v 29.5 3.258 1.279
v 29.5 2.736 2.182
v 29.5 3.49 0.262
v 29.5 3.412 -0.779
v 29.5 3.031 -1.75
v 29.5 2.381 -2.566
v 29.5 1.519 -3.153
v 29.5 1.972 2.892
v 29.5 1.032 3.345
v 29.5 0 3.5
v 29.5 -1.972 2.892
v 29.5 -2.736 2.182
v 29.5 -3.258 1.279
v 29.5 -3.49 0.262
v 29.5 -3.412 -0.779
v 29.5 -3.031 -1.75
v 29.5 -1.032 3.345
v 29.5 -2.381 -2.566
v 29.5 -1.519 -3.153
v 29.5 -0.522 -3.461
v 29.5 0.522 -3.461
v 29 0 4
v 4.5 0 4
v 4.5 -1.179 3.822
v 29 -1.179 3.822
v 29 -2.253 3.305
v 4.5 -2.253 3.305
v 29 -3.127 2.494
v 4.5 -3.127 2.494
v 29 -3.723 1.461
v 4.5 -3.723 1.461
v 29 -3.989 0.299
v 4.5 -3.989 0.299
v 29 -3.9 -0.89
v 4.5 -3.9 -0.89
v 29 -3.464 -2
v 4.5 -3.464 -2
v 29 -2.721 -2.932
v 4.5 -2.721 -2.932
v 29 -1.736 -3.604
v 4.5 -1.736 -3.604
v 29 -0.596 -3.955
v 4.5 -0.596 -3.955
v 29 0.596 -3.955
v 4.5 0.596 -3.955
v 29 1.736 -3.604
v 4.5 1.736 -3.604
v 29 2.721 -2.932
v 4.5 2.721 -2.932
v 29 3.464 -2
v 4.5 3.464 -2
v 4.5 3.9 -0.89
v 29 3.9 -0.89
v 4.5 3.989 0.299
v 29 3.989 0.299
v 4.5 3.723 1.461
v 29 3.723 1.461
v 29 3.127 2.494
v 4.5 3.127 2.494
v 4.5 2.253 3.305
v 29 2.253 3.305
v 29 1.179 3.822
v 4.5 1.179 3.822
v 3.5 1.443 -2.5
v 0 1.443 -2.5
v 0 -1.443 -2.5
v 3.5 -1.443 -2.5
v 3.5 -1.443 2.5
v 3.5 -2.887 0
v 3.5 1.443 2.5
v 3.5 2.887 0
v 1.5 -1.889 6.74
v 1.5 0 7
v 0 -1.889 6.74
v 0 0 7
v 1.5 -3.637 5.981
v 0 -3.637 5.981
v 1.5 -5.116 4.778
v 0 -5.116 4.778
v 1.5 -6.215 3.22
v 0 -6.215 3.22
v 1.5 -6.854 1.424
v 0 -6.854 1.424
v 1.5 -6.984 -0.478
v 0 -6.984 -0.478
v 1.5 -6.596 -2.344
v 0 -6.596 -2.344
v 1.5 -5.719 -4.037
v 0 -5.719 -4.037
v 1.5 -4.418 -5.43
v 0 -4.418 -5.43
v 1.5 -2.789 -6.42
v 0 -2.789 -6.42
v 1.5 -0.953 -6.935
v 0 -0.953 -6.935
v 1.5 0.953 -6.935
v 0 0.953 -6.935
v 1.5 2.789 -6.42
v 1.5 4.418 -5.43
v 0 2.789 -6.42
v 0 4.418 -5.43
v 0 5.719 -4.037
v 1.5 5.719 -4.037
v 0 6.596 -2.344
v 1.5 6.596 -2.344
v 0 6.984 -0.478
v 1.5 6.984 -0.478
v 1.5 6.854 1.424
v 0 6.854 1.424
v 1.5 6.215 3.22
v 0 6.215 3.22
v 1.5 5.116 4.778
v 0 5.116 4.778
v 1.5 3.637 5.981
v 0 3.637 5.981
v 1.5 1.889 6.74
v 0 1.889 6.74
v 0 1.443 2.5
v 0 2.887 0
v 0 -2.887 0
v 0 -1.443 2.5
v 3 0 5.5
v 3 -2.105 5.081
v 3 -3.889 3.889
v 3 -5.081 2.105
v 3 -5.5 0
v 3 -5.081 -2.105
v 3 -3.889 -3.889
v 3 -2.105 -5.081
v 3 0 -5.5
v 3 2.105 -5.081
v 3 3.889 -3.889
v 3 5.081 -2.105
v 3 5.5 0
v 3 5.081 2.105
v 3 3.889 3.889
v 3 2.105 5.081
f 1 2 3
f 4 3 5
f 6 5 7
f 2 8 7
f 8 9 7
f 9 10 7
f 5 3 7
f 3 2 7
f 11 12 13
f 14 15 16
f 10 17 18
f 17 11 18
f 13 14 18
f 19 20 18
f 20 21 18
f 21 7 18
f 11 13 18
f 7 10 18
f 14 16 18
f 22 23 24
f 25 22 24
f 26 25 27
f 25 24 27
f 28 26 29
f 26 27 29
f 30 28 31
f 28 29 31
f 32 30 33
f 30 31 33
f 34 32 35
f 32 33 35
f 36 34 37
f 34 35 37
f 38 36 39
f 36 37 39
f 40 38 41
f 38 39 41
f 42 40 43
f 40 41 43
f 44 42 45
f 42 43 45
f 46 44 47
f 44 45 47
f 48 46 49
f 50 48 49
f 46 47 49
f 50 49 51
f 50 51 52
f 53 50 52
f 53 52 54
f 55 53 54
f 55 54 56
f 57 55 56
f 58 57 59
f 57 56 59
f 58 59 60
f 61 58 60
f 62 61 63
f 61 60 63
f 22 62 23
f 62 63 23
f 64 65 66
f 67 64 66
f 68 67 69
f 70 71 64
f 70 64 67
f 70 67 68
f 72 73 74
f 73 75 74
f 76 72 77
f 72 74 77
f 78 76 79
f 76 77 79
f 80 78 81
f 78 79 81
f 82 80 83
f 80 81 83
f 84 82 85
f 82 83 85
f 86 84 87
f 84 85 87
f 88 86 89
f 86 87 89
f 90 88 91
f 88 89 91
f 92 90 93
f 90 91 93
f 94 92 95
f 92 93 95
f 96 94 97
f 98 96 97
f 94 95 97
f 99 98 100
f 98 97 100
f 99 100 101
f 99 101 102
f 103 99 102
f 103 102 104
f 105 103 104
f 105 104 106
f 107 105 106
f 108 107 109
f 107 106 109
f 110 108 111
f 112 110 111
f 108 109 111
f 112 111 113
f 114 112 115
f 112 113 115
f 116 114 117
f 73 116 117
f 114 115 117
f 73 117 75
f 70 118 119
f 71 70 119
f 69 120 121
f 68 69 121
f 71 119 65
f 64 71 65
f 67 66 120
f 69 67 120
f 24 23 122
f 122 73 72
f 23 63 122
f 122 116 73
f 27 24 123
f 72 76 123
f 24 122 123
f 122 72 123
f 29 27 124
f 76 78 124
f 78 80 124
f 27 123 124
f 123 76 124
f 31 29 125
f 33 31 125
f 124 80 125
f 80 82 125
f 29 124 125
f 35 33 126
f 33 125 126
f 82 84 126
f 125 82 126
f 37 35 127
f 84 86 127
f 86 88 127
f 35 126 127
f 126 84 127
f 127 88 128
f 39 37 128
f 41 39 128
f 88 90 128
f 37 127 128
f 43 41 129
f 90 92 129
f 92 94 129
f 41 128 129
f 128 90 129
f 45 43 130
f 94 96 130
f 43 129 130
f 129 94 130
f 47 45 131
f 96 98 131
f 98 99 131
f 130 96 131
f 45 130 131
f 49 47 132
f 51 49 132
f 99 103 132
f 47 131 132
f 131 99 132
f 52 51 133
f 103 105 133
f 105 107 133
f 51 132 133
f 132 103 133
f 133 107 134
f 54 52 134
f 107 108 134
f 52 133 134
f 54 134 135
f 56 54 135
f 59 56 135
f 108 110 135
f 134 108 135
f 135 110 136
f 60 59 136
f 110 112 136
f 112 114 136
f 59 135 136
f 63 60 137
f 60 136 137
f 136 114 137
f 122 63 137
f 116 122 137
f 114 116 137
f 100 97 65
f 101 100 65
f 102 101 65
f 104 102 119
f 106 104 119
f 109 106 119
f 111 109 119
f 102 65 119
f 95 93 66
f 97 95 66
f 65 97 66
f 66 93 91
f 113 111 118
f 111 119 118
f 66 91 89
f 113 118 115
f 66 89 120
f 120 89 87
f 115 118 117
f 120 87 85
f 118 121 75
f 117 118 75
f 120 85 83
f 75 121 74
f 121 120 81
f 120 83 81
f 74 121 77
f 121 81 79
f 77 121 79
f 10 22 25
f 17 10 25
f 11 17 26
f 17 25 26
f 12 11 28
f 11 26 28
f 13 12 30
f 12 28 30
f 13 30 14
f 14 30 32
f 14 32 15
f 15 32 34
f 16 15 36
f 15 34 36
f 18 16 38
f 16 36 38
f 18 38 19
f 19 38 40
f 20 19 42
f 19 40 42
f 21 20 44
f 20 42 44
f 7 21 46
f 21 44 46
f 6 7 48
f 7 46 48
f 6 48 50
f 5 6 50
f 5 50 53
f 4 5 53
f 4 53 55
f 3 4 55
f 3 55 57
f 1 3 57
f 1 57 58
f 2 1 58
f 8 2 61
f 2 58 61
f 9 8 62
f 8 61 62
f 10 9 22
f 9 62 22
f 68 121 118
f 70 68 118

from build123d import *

# Parameters (mm, degrees)
CUT_EXTRUDE1_DEPTH = 3.5
CHAMFER1_SIZE      = 0.5


with BuildPart() as part:
    # Sketch1 → Revolve1 (revolve)
    with BuildSketch(Plane.XY, mode=Mode.PRIVATE) as revolve1_sk:
        Polygon((0, 0), (29.5, 0), (29.5, 4), (4.5, 4), (1.5, 7), (0, 7), align=None)
    revolve(revolve1_sk.sketch.rotate(Axis((0, 0, 0), (1, 0, 0)), 90), axis=Axis((0, 0, 0), (1, 0, 0)))

    # Sketch2 → Cut-Extrude1 (cut)
    with BuildSketch(Plane.ZY):
        Polygon((0, 2.886751346), (-2.5, 1.443375673), (-2.5, -1.443375673), (0, -2.886751346), (2.5, -1.443375673), (2.5, 1.443375673), align=None)
    extrude(amount=-CUT_EXTRUDE1_DEPTH, mode=Mode.SUBTRACT)

    # Chamfer1
    chamfer1_edges = [part.edges().sort_by_distance(p)[0] for p in [
        (29.5, 0, -4),
    ]]
    chamfer(chamfer1_edges, length=CHAMFER1_SIZE)


solid = part.part
